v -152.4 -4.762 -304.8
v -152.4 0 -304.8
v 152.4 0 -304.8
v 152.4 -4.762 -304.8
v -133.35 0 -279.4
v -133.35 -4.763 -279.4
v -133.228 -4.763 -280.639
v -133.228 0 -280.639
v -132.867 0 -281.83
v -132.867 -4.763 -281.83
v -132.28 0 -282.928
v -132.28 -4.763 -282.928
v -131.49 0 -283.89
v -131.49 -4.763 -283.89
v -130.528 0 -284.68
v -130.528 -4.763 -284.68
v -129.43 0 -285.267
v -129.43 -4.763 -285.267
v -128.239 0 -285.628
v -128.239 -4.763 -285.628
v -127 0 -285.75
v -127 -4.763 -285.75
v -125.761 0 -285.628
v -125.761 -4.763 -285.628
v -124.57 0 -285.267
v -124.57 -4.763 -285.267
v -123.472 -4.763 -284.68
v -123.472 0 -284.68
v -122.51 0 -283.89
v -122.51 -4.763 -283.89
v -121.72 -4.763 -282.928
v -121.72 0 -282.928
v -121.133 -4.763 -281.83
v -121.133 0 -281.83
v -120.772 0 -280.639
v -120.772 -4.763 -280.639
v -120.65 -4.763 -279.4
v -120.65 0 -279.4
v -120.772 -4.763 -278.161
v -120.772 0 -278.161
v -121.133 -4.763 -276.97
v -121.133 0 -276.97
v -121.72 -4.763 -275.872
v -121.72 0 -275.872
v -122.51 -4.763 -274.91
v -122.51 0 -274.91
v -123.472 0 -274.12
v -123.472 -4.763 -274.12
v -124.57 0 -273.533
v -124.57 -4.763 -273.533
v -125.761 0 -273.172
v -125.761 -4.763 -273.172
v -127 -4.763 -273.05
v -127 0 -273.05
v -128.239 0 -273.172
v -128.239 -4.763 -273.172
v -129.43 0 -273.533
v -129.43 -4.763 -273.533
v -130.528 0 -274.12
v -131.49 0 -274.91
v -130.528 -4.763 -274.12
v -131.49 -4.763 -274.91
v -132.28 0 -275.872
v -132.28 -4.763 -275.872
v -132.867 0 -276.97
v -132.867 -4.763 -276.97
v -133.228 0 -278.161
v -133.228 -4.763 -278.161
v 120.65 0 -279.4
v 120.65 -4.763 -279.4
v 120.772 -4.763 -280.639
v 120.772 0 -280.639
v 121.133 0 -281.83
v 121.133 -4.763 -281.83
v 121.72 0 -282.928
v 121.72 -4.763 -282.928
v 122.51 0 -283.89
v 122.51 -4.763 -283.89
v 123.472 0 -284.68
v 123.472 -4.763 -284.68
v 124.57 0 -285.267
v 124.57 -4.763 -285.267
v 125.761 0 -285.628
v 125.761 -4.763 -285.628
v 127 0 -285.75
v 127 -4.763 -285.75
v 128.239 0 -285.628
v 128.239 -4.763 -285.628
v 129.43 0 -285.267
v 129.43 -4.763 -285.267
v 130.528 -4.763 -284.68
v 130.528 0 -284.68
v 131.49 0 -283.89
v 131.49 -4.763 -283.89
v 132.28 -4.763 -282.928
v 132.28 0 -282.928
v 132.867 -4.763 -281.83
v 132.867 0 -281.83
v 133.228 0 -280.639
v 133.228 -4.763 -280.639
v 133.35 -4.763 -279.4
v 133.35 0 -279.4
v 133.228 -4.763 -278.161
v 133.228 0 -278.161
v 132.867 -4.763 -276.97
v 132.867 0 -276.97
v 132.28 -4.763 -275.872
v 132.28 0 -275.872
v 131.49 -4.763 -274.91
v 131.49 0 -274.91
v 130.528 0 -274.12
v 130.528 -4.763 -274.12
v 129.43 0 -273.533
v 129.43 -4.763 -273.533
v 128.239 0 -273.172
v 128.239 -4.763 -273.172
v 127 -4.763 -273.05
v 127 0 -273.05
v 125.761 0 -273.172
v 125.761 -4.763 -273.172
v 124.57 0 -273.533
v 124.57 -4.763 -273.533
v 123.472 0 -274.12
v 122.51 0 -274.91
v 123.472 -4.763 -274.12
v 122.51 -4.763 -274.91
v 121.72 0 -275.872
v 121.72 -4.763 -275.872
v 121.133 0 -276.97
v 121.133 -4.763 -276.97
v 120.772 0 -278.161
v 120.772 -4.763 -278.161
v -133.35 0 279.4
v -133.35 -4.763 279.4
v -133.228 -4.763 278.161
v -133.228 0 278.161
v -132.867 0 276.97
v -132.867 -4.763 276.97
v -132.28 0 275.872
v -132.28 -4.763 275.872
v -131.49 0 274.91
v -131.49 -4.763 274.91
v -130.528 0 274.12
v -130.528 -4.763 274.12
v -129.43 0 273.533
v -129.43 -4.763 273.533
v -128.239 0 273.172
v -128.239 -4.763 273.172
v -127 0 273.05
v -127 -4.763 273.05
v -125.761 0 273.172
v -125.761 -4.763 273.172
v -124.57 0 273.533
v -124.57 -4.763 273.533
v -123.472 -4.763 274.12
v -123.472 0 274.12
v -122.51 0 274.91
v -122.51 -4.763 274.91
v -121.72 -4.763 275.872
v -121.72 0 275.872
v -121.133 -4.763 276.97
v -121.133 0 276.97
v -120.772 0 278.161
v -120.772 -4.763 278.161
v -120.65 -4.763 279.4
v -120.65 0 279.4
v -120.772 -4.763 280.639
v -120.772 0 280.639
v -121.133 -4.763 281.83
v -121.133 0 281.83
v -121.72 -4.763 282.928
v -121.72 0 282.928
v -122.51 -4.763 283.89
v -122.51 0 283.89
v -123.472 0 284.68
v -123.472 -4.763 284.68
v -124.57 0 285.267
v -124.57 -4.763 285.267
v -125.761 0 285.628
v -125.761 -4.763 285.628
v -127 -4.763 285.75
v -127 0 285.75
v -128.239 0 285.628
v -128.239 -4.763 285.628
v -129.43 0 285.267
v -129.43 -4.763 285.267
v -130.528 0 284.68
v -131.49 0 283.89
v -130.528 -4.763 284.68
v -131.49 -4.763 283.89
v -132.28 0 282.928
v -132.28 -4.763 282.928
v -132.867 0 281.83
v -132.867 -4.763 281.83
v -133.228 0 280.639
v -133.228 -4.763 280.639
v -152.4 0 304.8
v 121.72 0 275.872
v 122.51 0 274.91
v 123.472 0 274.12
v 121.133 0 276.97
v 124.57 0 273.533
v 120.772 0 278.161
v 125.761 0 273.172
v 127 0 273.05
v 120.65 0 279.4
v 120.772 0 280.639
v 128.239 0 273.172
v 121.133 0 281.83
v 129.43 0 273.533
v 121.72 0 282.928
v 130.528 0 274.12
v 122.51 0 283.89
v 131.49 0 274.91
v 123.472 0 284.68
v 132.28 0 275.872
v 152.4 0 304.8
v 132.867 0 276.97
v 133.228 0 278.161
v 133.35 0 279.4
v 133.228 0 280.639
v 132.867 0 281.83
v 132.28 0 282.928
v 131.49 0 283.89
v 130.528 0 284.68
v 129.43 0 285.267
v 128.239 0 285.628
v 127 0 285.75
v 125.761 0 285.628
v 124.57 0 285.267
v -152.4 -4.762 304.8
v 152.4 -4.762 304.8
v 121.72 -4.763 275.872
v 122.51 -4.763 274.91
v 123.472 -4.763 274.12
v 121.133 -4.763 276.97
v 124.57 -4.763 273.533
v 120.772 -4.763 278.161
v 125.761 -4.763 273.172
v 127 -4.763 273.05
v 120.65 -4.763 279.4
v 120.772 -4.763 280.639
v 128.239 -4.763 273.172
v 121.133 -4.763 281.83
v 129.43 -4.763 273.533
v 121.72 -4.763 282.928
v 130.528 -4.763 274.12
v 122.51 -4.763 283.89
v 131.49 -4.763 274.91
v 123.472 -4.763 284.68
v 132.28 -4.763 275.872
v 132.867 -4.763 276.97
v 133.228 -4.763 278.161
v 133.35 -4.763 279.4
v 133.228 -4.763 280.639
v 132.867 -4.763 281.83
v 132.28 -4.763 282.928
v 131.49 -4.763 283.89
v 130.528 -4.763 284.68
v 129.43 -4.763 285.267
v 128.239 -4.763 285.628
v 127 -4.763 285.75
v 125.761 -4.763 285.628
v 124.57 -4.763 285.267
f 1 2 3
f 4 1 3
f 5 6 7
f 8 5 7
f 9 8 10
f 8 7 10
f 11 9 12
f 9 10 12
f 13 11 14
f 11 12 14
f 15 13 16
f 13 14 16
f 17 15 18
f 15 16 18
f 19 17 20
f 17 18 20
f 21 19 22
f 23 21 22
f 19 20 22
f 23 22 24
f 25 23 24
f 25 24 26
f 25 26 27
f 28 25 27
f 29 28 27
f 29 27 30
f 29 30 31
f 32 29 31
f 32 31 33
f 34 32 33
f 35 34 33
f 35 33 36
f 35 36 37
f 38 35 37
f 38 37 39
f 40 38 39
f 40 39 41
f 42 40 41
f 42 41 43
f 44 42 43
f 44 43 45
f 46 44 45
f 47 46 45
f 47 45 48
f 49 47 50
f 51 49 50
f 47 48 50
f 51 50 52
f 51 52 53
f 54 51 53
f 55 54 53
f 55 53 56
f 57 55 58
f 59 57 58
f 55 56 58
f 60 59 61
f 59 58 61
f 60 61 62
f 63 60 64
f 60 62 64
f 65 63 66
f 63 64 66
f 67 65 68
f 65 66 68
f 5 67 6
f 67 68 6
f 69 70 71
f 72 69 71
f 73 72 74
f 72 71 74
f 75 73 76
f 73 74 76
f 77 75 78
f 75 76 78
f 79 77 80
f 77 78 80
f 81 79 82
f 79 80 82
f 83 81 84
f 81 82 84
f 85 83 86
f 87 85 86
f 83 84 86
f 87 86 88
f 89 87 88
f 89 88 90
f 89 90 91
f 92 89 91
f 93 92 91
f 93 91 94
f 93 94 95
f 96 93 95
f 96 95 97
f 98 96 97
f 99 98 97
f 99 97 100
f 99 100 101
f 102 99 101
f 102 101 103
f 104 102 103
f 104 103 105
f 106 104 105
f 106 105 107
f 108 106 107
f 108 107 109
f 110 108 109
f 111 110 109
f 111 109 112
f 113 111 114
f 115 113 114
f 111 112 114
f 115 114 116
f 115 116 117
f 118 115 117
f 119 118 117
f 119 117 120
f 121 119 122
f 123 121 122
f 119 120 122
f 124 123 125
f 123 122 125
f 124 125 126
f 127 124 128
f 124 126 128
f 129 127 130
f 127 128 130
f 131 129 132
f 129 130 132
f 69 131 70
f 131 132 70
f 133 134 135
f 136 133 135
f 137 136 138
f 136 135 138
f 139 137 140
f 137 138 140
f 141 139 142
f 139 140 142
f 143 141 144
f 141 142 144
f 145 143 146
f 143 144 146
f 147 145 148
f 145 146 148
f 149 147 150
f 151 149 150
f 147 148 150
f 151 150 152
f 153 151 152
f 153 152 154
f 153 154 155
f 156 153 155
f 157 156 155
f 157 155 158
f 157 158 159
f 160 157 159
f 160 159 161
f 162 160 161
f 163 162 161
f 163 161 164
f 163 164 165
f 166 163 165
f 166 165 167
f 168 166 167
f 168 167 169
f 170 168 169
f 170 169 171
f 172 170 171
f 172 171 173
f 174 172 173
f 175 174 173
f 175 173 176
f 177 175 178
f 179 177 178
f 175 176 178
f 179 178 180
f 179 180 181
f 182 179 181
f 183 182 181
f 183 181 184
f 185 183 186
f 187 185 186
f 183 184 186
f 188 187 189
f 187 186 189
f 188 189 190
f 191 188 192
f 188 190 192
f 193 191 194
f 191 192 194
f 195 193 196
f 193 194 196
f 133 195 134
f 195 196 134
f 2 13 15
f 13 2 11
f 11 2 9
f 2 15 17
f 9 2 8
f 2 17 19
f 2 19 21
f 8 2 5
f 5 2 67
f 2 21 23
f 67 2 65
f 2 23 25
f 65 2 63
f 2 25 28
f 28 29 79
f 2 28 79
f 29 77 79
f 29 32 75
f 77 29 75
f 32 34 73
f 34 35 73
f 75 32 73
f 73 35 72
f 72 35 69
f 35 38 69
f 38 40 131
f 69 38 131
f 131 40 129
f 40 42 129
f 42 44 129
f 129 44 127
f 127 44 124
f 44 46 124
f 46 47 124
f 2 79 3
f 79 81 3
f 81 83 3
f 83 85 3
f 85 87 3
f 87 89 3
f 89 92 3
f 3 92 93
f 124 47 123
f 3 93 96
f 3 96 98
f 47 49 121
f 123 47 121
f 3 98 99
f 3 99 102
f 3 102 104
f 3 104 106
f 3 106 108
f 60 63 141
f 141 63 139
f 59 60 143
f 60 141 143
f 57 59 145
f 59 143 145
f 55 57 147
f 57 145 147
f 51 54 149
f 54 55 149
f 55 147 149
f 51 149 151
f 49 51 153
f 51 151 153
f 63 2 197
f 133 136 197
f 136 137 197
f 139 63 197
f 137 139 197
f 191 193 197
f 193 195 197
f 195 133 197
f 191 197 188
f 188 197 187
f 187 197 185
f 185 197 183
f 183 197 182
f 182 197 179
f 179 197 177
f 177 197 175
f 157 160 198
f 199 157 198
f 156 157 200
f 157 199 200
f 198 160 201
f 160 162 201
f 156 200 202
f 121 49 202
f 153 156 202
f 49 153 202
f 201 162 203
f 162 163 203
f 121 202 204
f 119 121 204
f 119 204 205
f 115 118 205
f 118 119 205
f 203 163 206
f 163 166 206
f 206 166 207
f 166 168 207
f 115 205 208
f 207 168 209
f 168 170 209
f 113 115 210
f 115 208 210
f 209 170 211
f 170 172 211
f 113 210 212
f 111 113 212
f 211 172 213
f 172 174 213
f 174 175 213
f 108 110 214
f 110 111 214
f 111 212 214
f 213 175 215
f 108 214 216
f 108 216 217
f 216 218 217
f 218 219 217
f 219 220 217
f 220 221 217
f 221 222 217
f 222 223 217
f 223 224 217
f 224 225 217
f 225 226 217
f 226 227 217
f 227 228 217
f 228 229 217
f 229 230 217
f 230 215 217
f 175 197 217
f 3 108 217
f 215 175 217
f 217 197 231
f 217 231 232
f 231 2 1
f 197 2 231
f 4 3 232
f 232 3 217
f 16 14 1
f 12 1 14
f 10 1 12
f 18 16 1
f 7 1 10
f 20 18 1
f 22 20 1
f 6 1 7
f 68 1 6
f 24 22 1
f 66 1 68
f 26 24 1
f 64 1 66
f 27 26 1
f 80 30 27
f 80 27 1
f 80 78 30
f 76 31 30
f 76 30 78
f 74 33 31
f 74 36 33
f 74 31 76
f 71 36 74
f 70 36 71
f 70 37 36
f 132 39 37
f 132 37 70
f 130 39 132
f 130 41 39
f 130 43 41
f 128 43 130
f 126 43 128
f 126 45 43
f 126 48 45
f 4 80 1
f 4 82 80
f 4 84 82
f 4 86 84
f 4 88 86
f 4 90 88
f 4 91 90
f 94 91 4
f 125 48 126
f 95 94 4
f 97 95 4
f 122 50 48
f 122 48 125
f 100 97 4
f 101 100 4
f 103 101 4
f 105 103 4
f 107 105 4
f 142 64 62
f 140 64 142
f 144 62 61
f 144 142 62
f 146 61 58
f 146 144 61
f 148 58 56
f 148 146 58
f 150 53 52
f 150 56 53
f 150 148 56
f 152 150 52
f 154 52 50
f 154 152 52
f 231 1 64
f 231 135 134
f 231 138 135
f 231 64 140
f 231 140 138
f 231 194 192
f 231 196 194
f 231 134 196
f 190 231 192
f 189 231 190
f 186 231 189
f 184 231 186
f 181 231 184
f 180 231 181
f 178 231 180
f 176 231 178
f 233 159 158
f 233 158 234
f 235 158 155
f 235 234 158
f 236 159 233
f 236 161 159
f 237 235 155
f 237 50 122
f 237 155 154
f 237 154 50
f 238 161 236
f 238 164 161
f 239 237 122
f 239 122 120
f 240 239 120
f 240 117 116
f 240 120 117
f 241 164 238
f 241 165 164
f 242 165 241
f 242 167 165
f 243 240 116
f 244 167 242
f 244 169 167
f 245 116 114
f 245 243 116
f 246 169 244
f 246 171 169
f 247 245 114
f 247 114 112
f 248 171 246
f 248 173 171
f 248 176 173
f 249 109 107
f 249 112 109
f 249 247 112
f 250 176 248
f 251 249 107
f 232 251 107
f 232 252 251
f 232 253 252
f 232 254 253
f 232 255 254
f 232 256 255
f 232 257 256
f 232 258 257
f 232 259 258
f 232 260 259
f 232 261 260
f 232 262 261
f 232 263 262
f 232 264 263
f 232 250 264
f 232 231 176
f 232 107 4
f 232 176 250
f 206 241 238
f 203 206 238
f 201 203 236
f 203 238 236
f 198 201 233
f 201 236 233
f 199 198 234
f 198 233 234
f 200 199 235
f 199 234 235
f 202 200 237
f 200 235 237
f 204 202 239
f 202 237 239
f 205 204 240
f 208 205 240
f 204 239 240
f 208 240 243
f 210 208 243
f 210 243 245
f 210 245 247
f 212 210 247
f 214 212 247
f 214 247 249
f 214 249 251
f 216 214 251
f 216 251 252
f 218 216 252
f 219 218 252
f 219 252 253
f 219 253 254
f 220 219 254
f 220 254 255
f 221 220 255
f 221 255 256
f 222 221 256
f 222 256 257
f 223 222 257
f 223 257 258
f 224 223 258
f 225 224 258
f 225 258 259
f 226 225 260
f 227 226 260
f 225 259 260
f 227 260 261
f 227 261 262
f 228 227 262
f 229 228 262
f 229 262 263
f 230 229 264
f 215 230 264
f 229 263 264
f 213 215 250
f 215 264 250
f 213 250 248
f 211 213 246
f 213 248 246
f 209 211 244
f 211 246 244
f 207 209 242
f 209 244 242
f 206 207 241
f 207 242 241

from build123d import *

# Parameters (mm, degrees)
F0_W     = 304.8
F0_H     = 609.6
F2_DEPTH = 4.7625
F1_D     = 12.7


with BuildPart() as f2:
    # F0 (on Front) → F2 (new body)
    with BuildSketch(Plane.XZ):
        Rectangle(F0_W, F0_H)
    extrude(amount=F2_DEPTH)

    # F1 (through all)
    with Locations(Plane(origin=(0, 0, 0), x_dir=(1, 0, 0), z_dir=(0, 1, 0))):
        with Locations((-127, 279.4), (127, 279.4), (-127, -279.4), (127, -279.4)):
            Hole(F1_D / 2)


solid = f2.part
